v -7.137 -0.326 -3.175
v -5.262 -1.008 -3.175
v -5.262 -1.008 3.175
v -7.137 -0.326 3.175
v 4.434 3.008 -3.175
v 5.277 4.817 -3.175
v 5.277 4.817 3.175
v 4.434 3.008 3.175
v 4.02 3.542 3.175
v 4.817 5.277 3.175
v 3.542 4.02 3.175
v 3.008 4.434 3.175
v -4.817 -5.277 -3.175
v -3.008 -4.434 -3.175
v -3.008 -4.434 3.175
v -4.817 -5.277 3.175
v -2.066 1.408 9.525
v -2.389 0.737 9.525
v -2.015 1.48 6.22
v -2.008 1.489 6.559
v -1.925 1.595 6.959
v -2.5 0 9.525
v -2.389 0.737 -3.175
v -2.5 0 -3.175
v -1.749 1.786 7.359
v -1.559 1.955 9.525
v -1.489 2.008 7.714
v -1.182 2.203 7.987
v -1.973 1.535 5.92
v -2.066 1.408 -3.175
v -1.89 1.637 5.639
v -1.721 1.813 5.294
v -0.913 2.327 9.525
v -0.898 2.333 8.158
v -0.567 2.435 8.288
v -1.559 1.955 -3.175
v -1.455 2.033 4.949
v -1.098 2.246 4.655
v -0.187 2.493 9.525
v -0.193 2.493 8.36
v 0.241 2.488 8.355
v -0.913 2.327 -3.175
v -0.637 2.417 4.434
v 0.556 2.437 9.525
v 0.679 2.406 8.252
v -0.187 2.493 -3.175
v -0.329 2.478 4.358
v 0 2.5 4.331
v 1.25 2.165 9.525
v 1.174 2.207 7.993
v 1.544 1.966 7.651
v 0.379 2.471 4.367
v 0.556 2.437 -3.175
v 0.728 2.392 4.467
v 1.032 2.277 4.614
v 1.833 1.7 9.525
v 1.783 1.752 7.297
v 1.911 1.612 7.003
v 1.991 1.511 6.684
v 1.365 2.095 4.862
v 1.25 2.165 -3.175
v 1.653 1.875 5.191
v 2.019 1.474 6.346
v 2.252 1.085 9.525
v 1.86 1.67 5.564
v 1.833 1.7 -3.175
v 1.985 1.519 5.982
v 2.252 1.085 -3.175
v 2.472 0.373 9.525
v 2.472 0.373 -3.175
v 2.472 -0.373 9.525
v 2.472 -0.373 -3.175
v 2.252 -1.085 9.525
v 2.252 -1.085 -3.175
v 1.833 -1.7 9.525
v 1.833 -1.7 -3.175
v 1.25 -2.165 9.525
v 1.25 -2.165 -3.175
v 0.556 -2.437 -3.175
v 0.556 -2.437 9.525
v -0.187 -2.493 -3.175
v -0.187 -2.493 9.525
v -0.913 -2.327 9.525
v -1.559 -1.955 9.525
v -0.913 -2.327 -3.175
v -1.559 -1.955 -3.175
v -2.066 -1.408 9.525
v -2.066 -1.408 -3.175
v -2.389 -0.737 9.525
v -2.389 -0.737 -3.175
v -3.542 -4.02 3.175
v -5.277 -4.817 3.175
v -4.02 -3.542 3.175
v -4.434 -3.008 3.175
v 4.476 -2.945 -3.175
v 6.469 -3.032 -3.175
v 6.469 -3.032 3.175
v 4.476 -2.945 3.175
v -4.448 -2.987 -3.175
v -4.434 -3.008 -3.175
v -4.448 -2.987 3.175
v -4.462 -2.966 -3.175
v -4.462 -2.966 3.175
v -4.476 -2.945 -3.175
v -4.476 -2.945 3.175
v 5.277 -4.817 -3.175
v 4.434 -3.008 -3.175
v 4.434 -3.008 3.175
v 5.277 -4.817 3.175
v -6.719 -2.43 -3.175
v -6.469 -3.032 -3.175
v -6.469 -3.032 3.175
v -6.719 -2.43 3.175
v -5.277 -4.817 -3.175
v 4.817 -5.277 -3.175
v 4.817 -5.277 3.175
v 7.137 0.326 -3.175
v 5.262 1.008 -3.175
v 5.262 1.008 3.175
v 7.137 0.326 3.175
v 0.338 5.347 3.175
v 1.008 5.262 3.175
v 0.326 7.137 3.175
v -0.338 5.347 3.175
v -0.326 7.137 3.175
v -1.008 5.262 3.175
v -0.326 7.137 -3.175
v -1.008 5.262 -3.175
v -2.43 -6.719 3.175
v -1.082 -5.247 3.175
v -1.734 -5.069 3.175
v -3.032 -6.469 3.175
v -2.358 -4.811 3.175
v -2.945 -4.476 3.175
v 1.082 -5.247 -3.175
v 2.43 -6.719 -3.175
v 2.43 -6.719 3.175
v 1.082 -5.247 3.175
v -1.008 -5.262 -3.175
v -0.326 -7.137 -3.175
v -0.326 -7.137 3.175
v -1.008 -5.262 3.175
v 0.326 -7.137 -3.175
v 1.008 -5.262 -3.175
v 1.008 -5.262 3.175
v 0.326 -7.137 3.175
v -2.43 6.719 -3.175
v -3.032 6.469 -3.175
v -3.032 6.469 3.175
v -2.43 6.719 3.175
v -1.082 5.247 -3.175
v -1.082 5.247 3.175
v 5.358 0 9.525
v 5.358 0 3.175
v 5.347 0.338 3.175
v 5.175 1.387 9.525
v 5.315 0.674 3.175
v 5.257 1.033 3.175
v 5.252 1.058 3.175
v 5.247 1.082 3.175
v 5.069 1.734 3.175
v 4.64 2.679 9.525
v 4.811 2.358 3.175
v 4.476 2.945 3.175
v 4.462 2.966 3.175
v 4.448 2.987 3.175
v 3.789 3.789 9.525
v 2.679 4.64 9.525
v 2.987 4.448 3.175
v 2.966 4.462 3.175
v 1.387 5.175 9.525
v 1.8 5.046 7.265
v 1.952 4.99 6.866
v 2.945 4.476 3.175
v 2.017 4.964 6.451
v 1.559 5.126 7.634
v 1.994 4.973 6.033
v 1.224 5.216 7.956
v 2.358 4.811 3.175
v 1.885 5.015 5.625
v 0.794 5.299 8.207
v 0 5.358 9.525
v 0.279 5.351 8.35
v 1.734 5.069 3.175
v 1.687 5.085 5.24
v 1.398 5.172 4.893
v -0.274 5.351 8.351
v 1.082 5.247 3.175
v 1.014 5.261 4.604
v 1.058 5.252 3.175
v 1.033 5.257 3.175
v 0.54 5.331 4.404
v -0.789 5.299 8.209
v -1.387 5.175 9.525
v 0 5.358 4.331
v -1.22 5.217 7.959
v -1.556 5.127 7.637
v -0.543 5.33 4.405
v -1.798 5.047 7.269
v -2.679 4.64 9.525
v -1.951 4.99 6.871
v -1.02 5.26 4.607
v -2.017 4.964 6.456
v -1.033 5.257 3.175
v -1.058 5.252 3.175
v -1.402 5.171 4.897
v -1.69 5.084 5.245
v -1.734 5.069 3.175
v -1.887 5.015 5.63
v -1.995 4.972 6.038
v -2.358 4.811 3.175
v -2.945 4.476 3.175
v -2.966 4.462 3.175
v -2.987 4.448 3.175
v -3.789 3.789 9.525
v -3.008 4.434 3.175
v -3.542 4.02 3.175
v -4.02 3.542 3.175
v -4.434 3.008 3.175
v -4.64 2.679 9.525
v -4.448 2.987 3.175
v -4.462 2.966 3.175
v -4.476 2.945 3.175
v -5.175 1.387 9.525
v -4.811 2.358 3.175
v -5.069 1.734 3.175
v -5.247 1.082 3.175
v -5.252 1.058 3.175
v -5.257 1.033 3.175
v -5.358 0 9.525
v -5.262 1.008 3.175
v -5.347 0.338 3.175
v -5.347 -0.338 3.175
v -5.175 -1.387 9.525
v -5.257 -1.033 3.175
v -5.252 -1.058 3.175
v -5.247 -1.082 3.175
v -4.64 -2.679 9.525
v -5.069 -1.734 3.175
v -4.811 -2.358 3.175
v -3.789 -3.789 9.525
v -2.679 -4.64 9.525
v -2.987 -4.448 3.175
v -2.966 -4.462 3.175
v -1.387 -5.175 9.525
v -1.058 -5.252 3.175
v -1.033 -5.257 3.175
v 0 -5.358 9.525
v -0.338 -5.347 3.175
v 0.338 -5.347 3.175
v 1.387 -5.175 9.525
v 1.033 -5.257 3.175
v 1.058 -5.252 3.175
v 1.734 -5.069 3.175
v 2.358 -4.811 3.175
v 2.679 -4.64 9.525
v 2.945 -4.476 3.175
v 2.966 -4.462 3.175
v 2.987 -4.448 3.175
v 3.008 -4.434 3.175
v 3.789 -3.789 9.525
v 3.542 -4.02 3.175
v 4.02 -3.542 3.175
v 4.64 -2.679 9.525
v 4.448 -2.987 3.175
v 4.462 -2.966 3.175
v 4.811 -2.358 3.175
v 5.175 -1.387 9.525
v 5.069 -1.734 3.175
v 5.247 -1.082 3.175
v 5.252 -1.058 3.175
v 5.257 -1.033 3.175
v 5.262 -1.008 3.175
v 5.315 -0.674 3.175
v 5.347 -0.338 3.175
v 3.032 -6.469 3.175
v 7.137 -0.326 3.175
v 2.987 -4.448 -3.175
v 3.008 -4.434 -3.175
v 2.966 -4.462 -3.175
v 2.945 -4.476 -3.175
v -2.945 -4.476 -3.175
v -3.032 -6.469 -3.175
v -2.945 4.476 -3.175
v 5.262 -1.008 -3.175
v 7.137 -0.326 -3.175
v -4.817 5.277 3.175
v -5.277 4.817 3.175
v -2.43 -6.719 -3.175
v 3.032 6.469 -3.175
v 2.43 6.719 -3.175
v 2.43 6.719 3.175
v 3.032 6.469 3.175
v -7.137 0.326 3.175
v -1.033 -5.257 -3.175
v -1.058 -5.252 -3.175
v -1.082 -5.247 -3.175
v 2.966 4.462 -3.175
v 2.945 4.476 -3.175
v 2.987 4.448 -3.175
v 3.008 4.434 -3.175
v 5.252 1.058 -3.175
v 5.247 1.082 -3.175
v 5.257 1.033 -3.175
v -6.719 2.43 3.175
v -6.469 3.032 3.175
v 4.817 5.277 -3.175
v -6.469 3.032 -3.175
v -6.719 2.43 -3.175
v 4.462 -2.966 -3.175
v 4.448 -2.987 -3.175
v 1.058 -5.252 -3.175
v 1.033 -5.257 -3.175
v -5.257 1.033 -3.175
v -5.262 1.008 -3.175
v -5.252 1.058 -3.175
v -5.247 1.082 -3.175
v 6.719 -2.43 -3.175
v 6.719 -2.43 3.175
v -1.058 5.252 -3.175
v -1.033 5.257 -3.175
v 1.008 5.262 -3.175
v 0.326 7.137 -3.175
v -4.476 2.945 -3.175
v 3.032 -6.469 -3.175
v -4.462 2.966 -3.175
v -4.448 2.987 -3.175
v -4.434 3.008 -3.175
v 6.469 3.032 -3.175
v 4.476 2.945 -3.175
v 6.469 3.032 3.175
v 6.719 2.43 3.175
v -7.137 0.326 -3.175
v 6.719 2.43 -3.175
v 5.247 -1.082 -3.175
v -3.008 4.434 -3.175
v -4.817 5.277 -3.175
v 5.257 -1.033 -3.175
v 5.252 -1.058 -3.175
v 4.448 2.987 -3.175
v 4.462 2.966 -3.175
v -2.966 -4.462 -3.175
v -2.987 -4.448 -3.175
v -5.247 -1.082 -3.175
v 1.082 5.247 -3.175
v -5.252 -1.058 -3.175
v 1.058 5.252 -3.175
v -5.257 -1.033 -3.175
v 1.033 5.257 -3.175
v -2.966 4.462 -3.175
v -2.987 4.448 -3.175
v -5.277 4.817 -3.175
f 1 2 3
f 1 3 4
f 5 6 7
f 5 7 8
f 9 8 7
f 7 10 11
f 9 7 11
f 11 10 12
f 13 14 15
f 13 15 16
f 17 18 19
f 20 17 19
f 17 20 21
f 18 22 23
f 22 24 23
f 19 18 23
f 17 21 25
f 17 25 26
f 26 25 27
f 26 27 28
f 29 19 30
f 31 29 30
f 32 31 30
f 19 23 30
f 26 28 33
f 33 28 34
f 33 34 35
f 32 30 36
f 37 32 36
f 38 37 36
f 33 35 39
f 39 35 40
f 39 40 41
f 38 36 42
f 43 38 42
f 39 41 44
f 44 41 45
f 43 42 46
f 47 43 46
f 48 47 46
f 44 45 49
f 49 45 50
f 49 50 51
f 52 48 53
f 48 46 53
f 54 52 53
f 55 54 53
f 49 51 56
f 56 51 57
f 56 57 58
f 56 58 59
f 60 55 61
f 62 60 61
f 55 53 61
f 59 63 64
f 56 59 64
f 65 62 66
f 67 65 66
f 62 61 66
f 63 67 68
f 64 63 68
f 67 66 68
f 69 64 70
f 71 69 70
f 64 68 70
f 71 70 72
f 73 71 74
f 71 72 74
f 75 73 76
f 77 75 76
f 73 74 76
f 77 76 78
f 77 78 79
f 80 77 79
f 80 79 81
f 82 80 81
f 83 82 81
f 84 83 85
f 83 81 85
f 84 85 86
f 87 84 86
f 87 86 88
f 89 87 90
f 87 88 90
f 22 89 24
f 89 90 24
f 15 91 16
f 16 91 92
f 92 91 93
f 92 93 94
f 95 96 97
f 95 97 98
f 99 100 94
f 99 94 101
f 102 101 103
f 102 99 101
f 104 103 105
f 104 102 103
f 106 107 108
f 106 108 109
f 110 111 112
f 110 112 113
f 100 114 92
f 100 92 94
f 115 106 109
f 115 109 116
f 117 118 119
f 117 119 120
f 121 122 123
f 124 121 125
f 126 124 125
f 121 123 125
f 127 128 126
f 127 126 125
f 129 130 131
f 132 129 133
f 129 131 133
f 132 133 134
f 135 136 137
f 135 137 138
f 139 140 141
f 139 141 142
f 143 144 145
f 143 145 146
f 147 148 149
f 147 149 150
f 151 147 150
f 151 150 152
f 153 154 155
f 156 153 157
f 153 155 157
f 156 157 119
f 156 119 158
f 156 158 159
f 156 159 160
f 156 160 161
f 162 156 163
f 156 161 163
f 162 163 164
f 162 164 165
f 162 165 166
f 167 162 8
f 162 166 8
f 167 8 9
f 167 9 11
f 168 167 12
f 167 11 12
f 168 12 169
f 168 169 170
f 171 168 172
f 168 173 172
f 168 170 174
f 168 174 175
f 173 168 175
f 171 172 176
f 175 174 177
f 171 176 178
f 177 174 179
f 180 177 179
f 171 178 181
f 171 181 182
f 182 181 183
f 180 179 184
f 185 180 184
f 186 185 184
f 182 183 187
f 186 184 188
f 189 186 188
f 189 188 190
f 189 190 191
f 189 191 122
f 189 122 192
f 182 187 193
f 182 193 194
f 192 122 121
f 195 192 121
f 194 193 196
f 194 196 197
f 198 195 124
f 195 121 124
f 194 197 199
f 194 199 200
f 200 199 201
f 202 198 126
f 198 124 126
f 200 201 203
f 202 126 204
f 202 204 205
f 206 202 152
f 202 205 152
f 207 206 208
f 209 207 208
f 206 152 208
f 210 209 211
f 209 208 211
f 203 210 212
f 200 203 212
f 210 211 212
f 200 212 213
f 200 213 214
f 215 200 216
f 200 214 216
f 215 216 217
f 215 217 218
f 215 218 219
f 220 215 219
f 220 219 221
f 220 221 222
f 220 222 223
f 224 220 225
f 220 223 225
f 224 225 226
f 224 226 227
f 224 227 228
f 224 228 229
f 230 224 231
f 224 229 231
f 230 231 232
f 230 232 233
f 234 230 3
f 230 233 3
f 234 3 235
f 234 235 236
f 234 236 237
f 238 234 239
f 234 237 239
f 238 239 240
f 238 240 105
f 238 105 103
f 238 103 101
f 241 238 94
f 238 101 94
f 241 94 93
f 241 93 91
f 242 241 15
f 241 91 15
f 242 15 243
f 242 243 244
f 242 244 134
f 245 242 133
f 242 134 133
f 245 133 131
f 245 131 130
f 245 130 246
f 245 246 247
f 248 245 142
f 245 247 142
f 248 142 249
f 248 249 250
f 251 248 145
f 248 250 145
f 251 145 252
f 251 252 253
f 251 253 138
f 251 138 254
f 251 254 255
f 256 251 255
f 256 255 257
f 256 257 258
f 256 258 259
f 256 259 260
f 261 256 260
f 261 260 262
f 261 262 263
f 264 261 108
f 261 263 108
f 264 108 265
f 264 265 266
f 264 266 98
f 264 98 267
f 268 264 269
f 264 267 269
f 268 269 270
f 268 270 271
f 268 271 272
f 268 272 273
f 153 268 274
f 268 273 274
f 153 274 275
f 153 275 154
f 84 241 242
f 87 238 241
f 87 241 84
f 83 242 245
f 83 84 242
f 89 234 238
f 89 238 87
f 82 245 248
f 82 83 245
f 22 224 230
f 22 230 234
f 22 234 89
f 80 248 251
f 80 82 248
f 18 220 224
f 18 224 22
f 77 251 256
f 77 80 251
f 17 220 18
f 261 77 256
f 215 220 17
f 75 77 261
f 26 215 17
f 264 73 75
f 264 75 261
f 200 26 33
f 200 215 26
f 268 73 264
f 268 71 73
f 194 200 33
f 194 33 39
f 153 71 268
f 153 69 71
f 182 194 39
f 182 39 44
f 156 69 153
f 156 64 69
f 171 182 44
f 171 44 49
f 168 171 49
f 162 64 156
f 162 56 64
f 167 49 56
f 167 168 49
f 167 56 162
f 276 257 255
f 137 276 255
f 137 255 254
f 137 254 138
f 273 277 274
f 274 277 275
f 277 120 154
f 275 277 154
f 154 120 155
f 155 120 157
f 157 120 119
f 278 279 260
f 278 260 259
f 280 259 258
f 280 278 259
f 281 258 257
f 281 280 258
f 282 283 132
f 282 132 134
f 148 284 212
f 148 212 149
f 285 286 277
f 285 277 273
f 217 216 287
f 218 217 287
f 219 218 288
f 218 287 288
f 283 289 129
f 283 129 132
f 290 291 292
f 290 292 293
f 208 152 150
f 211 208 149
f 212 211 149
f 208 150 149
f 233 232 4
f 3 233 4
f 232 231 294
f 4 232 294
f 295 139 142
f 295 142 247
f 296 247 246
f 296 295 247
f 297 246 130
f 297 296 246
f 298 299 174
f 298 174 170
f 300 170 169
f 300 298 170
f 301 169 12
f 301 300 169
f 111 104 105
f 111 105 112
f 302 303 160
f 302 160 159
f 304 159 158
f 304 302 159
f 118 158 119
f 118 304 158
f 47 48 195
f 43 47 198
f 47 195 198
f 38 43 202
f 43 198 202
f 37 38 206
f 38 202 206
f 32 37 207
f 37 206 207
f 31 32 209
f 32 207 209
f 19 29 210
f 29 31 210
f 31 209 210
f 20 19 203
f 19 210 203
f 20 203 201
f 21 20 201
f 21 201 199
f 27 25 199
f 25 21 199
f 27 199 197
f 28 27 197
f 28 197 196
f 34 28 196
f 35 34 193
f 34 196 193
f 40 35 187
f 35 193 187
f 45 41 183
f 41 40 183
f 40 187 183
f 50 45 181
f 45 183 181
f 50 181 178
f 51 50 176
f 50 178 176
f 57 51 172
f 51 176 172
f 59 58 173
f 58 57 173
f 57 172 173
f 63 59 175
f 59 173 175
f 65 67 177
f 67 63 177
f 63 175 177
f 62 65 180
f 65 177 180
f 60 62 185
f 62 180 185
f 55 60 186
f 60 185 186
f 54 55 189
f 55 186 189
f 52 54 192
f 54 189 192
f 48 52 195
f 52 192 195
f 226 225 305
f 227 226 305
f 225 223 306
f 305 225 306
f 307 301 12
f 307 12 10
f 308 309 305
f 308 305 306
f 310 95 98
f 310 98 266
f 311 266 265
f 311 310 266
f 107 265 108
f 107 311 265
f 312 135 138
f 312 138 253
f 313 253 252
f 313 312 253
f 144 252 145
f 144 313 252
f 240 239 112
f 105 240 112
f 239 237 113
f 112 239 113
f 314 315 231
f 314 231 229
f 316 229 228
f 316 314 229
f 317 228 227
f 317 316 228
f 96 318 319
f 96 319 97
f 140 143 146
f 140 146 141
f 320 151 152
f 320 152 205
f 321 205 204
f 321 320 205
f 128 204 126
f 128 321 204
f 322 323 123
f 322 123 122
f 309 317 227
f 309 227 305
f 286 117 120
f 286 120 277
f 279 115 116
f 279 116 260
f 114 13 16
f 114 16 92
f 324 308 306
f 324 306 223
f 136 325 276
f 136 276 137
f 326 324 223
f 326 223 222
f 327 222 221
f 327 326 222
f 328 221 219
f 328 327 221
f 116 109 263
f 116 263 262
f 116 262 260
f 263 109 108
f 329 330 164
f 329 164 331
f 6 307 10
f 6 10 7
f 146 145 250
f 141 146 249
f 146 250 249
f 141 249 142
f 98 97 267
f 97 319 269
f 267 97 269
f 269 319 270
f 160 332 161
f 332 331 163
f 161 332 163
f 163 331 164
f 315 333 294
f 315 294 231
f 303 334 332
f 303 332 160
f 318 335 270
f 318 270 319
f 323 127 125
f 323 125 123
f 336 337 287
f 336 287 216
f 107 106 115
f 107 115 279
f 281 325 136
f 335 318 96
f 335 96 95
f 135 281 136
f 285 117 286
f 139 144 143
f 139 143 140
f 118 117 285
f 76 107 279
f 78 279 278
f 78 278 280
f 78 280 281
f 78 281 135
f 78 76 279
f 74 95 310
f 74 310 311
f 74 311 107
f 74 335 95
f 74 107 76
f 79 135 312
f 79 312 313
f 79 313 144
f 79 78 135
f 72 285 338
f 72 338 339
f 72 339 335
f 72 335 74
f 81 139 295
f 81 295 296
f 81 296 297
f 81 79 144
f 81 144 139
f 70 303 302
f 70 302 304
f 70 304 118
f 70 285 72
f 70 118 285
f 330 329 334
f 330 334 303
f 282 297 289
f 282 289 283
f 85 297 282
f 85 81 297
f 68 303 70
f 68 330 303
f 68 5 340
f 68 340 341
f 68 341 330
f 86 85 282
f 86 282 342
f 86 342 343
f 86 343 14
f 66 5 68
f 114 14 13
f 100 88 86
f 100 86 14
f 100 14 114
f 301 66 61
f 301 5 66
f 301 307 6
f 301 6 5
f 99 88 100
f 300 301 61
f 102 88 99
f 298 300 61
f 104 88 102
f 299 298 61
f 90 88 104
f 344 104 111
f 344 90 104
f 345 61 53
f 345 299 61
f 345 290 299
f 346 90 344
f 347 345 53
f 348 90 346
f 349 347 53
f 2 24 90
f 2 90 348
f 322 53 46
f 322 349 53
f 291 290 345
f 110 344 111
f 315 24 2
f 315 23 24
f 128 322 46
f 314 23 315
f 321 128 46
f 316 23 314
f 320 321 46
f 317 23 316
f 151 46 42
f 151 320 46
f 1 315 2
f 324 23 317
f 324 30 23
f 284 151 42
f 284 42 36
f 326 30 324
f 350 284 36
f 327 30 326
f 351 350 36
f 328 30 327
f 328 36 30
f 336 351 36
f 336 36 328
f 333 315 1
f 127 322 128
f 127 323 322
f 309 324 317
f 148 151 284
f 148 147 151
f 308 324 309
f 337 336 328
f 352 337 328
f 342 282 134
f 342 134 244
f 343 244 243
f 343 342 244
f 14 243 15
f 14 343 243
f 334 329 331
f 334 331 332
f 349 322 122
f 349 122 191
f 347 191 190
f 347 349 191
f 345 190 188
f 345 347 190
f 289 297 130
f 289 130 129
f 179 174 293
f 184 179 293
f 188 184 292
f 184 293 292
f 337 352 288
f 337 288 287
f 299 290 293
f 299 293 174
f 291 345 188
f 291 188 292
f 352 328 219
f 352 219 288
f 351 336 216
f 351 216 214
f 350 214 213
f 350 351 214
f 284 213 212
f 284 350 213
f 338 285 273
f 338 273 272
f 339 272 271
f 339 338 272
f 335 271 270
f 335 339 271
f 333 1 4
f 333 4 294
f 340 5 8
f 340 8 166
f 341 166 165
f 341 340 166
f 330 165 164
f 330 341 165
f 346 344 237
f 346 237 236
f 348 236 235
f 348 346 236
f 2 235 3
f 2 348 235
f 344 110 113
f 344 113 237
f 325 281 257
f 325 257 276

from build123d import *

# Parameters (mm, degrees)
BOSS_EXTRUDE1_DEPTH        = 6.35
SKETCH2_R                  = 5.357812451
BOSS_EXTRUDE2_DEPTH        = 6.35
F_10_CLEARANCE_HOLE1_D     = 5
F_10_CLEARANCE_HOLE1_DEPTH = 12.7
SKETCH5_W                  = 2.0193
SKETCH5_H                  = 5.66348411


with BuildPart() as part:
    # Sketch1 → Boss-Extrude1 (new body)
    with BuildSketch(Plane(origin=(0, 0, -3.175), x_dir=(-1, 0, 0), z_dir=(0, 0, -1))):
        with BuildLine():
            Line((-4.475719216, 2.94518093), (-6.469475121, 3.032230191))
            Line((-6.469475121, 3.032230191), (-6.718720366, 2.430498941))
            Line((-6.718720366, 2.430498941), (-5.247368905, 1.082253729))
            ThreePointArc((-5.247368905, 1.082253729), (-5.25486353, 1.045257315), (-5.262097316, 1.008209016))
            Line((-5.262097316, 1.008209016), (-7.137399981, 0.325654666))
            Line((-7.137399981, 0.325654666), (-7.137399981, -0.325654551))
            Line((-7.137399981, -0.325654551), (-5.262097381, -1.008208899))
            ThreePointArc((-5.262097381, -1.008208899), (-5.254863555, -1.045257412), (-5.247368888, -1.08225404))
            Line((-5.247368888, -1.08225404), (-6.718720366, -2.43049927))
            Line((-6.718720366, -2.43049927), (-6.469475121, -3.03223052))
            Line((-6.469475121, -3.03223052), (-4.475719151, -2.945181254))
            ThreePointArc((-4.475719151, -2.945181254), (-4.454858201, -2.97664122), (-4.433776122, -3.007953433))
            Line((-4.433776122, -3.007953433), (-5.277176571, -4.816631533))
            Line((-5.277176571, -4.816631533), (-4.816631353, -5.277176632))
            Line((-4.816631353, -5.277176632), (-3.007953331, -4.433776241))
            ThreePointArc((-3.007953331, -4.433776241), (-2.976641072, -4.454858352), (-2.945181059, -4.475719332))
            Line((-2.945181059, -4.475719332), (-3.032230324, -6.469475317))
            Line((-3.032230324, -6.469475317), (-2.430499074, -6.718720562))
            Line((-2.430499074, -6.718720562), (-1.082253821, -5.247369057))
            ThreePointArc((-1.082253821, -5.247369057), (-1.045257355, -5.254863691), (-1.008209005, -5.262097487))
            Line((-1.008209005, -5.262097487), (-0.325654634, -7.137400208))
            Line((-0.325654634, -7.137400208), (0.325654583, -7.137400208))
            Line((0.325654583, -7.137400208), (1.008208941, -5.262097516))
            ThreePointArc((1.008208941, -5.262097516), (1.045257356, -5.254863709), (1.082253886, -5.247369061))
            Line((1.082253886, -5.247369061), (2.430499137, -6.718720562))
            Line((2.430499137, -6.718720562), (3.032230387, -6.469475317))
            Line((3.032230387, -6.469475317), (2.945181121, -4.475719349))
            ThreePointArc((2.945181121, -4.475719349), (2.976641089, -4.454858399), (3.007953303, -4.433776319))
            Line((3.007953303, -4.433776319), (4.8166314, -5.277176767))
            Line((4.8166314, -5.277176767), (5.277176499, -4.816631549))
            Line((5.277176499, -4.816631549), (4.433776123, -3.007953559))
            ThreePointArc((4.433776123, -3.007953559), (4.454858245, -2.976641285), (4.475719236, -2.945181257))
            Line((4.475719236, -2.945181257), (6.469475184, -3.03223052))
            Line((6.469475184, -3.03223052), (6.718720429, -2.43049927))
            Line((6.718720429, -2.43049927), (5.247368971, -1.08225406))
            ThreePointArc((5.247368971, -1.08225406), (5.254863613, -1.045257562), (5.262097415, -1.008209179))
            Line((5.262097415, -1.008209179), (7.137400075, -0.32565483))
            Line((7.137400075, -0.32565483), (7.137400075, 0.325654387))
            Line((7.137400075, 0.325654387), (5.26209746, 1.008208717))
            ThreePointArc((5.26209746, 1.008208717), (5.254863645, 1.045257174), (5.247368989, 1.082253746))
            Line((5.247368989, 1.082253746), (6.718720429, 2.430498941))
            Line((6.718720429, 2.430498941), (6.469475184, 3.032230191))
            Line((6.469475184, 3.032230191), (4.475719304, 2.945180929))
            ThreePointArc((4.475719304, 2.945180929), (4.454858329, 2.976640935), (4.433776224, 3.007953186))
            Line((4.433776224, 3.007953186), (5.277176634, 4.816631204))
            Line((5.277176634, 4.816631204), (4.816631416, 5.277176303))
            Line((4.816631416, 5.277176303), (3.007953499, 4.433775961))
            ThreePointArc((3.007953499, 4.433775961), (2.976641191, 4.454858106), (2.945181127, 4.47571912))
            Line((2.945181127, 4.47571912), (3.032230387, 6.469474988))
            Line((3.032230387, 6.469474988), (2.430499137, 6.718720233))
            Line((2.430499137, 6.718720233), (1.082253963, 5.24736882))
            ThreePointArc((1.082253963, 5.24736882), (1.045257437, 5.254863468), (1.008209026, 5.262097275))
            Line((1.008209026, 5.262097275), (0.325654697, 7.137399816))
            Line((0.325654697, 7.137399816), (-0.32565452, 7.137399816))
            Line((-0.32565452, 7.137399816), (-1.008208848, 5.262097292))
            ThreePointArc((-1.008208848, 5.262097292), (-1.045257316, 5.254863474), (-1.082253899, 5.247368816))
            Line((-1.082253899, 5.247368816), (-2.430499074, 6.718720233))
            Line((-2.430499074, 6.718720233), (-3.032230324, 6.469474988))
            Line((-3.032230324, 6.469474988), (-2.945181062, 4.475719106))
            ThreePointArc((-2.945181062, 4.475719106), (-2.976641066, 4.454858131), (-3.007953316, 4.433776026))
            Line((-3.007953316, 4.433776026), (-4.816631337, 5.277176438))
            Line((-4.816631337, 5.277176438), (-5.277176436, 4.81663122))
            Line((-5.277176436, 4.81663122), (-4.433776079, 3.007953271))
            ThreePointArc((-4.433776079, 3.007953271), (-4.454858213, 2.976640978), (-4.475719216, 2.94518093))
        make_face()
    extrude(amount=-BOSS_EXTRUDE1_DEPTH)

    # Sketch2 → Boss-Extrude2 (add)
    with BuildSketch(Plane.XY.offset(3.175)):
        with Locations((-1.2e-08, 5.2e-08)):
            Circle(SKETCH2_R)
    extrude(amount=BOSS_EXTRUDE2_DEPTH)

    # #10 Clearance Hole1
    with Locations(Plane.XY.offset(9.525)):
        with Locations((0, 0)):
            Hole(F_10_CLEARANCE_HOLE1_D / 2, depth=F_10_CLEARANCE_HOLE1_DEPTH)

    # Sketch5 → #21 (0.159) Diameter Hole1 (revolve, cut)
    with BuildSketch(Plane(origin=(0, 1.473915707, 6.35), x_dir=(0, 0, -1), z_dir=(1, 0, 0))):
        with Locations((1.00965, 2.831742055)):
            Rectangle(SKETCH5_W, SKETCH5_H)
    revolve(axis=Axis((0, -4.876084293, 6.35), (0, 1, 0)), mode=Mode.SUBTRACT)


solid = part.part
